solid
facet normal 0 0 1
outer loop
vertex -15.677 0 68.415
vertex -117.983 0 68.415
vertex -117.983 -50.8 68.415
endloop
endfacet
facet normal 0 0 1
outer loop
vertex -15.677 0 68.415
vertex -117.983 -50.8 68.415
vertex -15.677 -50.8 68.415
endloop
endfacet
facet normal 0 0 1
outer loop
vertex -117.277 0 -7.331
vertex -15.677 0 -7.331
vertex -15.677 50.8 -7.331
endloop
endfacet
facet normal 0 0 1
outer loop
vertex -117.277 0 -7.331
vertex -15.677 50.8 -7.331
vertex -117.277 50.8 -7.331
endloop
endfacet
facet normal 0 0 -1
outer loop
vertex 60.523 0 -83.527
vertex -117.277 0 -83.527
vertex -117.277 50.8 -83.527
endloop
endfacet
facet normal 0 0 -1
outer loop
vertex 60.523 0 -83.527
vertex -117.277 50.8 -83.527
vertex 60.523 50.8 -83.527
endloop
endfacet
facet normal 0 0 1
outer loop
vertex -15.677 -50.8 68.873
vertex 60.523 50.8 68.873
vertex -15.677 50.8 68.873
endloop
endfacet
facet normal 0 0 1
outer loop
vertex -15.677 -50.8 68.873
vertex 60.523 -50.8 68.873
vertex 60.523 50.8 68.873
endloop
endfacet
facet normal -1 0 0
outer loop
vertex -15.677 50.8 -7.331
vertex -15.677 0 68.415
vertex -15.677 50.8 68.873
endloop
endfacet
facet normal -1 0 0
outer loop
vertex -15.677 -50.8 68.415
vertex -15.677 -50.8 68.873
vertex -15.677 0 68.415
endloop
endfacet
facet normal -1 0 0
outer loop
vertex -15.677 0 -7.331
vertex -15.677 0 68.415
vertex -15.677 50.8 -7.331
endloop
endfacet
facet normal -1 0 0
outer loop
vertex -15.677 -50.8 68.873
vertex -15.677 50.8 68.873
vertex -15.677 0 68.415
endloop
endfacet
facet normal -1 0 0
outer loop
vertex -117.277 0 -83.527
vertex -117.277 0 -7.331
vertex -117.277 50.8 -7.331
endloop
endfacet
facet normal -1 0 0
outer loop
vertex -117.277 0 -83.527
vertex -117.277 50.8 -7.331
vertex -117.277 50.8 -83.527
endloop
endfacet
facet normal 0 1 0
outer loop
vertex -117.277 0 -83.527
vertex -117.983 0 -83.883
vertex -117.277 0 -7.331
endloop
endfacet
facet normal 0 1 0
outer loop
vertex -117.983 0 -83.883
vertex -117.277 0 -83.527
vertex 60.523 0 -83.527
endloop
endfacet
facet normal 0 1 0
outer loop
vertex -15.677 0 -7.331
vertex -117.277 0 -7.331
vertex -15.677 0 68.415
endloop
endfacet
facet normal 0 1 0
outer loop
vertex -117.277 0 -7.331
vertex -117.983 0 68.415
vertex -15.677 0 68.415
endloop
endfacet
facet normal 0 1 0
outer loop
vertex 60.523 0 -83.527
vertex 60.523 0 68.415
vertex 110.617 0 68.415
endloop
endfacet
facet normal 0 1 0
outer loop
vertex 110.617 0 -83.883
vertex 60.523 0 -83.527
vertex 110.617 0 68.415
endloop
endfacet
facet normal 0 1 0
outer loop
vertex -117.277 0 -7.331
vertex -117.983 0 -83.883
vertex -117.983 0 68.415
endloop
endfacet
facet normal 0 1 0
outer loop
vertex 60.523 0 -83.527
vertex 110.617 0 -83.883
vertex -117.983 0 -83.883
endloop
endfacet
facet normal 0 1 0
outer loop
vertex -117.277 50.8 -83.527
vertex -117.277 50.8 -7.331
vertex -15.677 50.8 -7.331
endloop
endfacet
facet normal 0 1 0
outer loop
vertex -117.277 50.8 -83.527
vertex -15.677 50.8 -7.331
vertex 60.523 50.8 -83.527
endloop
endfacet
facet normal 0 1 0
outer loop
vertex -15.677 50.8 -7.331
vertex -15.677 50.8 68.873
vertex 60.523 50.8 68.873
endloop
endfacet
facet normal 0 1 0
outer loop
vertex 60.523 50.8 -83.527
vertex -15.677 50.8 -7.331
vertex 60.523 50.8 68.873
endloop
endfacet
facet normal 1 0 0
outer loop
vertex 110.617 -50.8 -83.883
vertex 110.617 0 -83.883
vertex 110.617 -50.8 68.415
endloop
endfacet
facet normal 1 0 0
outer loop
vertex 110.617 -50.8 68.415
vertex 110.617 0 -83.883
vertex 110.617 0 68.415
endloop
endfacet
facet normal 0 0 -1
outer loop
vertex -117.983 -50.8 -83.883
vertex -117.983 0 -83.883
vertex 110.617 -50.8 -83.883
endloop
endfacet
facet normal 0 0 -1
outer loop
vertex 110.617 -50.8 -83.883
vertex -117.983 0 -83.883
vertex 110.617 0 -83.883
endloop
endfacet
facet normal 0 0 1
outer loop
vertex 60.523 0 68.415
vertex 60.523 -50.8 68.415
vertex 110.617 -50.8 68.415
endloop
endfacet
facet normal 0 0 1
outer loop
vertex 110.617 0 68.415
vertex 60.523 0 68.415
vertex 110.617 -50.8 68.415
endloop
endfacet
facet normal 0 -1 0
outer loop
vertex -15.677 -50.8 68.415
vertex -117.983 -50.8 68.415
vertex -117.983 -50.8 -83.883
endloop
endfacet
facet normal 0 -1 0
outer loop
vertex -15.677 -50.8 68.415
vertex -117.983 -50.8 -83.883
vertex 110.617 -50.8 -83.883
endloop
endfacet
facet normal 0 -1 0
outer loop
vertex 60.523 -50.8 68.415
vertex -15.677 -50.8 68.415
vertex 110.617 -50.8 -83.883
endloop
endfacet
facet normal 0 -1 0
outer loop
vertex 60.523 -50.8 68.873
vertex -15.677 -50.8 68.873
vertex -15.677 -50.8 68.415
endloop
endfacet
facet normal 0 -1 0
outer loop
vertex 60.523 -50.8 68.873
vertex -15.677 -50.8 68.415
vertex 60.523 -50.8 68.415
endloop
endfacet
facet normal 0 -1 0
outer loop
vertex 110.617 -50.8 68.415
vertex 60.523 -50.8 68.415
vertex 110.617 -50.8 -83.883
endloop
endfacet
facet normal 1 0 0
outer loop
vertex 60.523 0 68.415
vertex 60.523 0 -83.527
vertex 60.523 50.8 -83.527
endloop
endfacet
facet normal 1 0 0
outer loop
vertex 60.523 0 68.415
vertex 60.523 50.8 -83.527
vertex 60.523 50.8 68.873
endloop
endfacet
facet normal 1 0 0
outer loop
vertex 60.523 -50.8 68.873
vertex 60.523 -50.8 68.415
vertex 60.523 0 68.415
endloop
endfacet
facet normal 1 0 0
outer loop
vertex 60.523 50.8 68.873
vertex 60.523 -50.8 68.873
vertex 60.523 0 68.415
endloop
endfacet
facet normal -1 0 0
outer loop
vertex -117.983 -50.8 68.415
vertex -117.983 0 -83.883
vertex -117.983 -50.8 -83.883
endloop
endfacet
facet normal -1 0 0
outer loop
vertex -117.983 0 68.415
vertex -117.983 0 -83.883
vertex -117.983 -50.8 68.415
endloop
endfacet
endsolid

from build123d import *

# Parameters (mm, degrees)
F0_W     = 228.6
F0_H     = 152.297022
F1_DEPTH = 50.8
F3_DEPTH = 50.8


with BuildPart() as f1:
    # F0 (on Front) → F1 (new body)
    with BuildSketch(Plane.XZ):
        with Locations((-3.682856, -7.733995)):
            Rectangle(F0_W, F0_H)
    extrude(amount=F1_DEPTH)

    # F2 (on Front) → F3 (join, symmetric)
    with BuildSketch(Plane.XZ):
        Polygon((-15.677309, -7.330912), (-117.277309, -7.330912), (-117.277309, -83.527267), (60.522691, -83.527267), (60.522691, 68.872733), (-15.677309, 68.872733), align=None)
    extrude(amount=F3_DEPTH, both=True)


solid = f1.part
